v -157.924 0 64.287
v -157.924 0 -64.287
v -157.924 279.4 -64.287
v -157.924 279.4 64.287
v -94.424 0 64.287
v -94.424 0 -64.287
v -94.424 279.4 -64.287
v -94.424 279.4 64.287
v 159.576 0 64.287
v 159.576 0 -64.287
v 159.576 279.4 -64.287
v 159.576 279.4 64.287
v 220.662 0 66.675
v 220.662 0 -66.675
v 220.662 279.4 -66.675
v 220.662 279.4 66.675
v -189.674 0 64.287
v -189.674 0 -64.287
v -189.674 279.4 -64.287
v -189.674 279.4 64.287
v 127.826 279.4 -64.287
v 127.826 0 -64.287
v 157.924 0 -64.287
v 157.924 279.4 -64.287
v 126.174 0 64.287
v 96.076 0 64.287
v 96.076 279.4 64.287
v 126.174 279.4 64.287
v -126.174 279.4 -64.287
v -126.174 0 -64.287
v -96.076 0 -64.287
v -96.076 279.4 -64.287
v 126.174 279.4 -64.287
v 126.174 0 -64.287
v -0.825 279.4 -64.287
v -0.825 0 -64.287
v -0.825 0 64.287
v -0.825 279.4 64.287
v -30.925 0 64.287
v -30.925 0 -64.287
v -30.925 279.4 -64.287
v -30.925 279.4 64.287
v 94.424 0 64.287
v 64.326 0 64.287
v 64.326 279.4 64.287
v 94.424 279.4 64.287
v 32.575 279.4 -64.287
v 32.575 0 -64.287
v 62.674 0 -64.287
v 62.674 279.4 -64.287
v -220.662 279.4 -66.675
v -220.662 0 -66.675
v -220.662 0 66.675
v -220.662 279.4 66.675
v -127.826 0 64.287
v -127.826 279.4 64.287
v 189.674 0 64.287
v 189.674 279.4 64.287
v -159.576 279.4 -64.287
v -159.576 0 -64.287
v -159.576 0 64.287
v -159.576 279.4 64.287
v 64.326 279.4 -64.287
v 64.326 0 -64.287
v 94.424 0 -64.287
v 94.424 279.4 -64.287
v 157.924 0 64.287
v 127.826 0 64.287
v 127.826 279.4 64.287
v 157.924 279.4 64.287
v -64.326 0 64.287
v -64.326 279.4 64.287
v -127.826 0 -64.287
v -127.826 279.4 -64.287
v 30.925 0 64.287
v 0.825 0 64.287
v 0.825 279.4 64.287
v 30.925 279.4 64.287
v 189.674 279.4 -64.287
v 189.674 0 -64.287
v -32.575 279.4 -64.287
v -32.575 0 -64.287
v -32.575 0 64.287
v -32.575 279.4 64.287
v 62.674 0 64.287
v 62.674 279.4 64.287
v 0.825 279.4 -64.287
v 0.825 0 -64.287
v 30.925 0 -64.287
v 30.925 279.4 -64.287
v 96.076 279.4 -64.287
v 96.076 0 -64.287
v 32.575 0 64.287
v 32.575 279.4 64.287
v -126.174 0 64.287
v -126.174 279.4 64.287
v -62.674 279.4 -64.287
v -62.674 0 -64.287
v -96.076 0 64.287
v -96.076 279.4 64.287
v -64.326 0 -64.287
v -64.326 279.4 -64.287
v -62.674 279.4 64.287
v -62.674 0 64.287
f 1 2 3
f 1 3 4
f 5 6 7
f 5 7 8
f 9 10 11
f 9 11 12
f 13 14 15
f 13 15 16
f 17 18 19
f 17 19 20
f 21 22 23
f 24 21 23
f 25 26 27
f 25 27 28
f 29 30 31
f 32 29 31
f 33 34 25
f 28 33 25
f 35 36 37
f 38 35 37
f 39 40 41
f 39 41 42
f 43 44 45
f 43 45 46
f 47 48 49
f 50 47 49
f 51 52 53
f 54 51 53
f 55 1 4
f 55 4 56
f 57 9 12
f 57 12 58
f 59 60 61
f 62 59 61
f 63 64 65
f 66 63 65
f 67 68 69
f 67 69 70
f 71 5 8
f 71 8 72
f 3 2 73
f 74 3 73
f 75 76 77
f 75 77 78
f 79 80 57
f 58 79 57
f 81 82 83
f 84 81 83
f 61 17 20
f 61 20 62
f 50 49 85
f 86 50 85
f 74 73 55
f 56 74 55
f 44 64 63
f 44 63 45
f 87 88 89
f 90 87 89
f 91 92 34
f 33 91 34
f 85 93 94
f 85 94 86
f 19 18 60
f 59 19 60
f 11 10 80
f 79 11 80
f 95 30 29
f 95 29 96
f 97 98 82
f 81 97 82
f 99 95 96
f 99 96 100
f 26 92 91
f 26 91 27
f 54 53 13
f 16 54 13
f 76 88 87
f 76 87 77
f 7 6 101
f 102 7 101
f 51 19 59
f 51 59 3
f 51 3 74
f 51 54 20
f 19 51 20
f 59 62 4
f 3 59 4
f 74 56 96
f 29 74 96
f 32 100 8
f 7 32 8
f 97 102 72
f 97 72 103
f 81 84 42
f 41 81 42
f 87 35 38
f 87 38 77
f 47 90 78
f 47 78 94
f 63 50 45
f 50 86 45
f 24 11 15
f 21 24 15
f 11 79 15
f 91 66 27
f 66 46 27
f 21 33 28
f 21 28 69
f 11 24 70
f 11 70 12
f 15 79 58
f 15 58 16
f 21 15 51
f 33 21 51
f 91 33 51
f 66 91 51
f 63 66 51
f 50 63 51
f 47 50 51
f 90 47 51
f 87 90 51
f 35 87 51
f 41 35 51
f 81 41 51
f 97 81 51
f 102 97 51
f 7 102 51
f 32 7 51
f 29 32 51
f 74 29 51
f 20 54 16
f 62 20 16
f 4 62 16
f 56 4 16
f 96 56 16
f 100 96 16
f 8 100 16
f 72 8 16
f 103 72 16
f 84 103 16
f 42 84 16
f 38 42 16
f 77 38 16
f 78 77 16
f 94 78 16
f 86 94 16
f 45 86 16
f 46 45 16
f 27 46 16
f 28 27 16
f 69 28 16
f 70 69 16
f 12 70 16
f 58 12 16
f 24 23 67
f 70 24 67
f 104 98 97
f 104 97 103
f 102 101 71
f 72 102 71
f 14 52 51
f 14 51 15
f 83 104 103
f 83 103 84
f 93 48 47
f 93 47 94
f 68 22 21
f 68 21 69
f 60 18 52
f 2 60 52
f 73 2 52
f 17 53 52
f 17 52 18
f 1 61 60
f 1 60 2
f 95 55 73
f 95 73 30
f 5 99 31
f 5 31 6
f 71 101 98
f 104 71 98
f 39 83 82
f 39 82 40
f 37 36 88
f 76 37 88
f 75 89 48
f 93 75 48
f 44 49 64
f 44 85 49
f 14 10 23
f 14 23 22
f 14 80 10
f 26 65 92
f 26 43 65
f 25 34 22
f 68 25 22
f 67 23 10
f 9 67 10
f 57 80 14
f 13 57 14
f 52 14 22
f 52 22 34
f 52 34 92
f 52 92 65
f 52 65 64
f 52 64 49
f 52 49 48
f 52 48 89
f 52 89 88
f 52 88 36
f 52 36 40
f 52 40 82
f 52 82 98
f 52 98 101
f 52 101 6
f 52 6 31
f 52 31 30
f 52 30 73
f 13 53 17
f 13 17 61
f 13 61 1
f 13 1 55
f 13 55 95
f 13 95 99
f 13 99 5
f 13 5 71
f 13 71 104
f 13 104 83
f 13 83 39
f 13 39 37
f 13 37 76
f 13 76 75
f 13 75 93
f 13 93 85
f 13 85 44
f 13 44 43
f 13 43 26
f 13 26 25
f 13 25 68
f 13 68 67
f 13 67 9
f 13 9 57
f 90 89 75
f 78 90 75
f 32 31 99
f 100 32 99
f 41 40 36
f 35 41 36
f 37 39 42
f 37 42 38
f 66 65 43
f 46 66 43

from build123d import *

# Parameters (mm, degrees)
F0_W     = 441.325
F0_H     = 133.35
F0_W_2   = 30.099
F0_H_2   = 128.5748
F1_DEPTH = 279.4


with BuildPart() as f1:
    # F0 (on Front) → F1 (new body)
    with BuildSketch(Plane.XZ):
        Rectangle(F0_W, F0_H)
        with Locations((-174.625, -2e-06)):
            Rectangle(F0_W_2, F0_H_2, mode=Mode.SUBTRACT)
        with Locations((-142.875, -2e-06)):
            Rectangle(F0_W_2, F0_H_2, mode=Mode.SUBTRACT)
        with Locations((-111.125, -2e-06)):
            Rectangle(F0_W_2, F0_H_2, mode=Mode.SUBTRACT)
        with Locations((-79.375, -2e-06)):
            Rectangle(F0_W_2, F0_H_2, mode=Mode.SUBTRACT)
        with Locations((-47.625, -2e-06)):
            Rectangle(F0_W_2, F0_H_2, mode=Mode.SUBTRACT)
        with Locations((-15.875, -2e-06)):
            Rectangle(F0_W_2, F0_H_2, mode=Mode.SUBTRACT)
        with Locations((15.875, -2e-06)):
            Rectangle(F0_W_2, F0_H_2, mode=Mode.SUBTRACT)
        with Locations((47.625, -2e-06)):
            Rectangle(F0_W_2, F0_H_2, mode=Mode.SUBTRACT)
        with Locations((79.375, -2e-06)):
            Rectangle(F0_W_2, F0_H_2, mode=Mode.SUBTRACT)
        with Locations((111.125, -2e-06)):
            Rectangle(F0_W_2, F0_H_2, mode=Mode.SUBTRACT)
        with Locations((142.875, -2e-06)):
            Rectangle(F0_W_2, F0_H_2, mode=Mode.SUBTRACT)
        with Locations((174.625, -2e-06)):
            Rectangle(F0_W_2, F0_H_2, mode=Mode.SUBTRACT)
    extrude(amount=-F1_DEPTH)


solid = f1.part
